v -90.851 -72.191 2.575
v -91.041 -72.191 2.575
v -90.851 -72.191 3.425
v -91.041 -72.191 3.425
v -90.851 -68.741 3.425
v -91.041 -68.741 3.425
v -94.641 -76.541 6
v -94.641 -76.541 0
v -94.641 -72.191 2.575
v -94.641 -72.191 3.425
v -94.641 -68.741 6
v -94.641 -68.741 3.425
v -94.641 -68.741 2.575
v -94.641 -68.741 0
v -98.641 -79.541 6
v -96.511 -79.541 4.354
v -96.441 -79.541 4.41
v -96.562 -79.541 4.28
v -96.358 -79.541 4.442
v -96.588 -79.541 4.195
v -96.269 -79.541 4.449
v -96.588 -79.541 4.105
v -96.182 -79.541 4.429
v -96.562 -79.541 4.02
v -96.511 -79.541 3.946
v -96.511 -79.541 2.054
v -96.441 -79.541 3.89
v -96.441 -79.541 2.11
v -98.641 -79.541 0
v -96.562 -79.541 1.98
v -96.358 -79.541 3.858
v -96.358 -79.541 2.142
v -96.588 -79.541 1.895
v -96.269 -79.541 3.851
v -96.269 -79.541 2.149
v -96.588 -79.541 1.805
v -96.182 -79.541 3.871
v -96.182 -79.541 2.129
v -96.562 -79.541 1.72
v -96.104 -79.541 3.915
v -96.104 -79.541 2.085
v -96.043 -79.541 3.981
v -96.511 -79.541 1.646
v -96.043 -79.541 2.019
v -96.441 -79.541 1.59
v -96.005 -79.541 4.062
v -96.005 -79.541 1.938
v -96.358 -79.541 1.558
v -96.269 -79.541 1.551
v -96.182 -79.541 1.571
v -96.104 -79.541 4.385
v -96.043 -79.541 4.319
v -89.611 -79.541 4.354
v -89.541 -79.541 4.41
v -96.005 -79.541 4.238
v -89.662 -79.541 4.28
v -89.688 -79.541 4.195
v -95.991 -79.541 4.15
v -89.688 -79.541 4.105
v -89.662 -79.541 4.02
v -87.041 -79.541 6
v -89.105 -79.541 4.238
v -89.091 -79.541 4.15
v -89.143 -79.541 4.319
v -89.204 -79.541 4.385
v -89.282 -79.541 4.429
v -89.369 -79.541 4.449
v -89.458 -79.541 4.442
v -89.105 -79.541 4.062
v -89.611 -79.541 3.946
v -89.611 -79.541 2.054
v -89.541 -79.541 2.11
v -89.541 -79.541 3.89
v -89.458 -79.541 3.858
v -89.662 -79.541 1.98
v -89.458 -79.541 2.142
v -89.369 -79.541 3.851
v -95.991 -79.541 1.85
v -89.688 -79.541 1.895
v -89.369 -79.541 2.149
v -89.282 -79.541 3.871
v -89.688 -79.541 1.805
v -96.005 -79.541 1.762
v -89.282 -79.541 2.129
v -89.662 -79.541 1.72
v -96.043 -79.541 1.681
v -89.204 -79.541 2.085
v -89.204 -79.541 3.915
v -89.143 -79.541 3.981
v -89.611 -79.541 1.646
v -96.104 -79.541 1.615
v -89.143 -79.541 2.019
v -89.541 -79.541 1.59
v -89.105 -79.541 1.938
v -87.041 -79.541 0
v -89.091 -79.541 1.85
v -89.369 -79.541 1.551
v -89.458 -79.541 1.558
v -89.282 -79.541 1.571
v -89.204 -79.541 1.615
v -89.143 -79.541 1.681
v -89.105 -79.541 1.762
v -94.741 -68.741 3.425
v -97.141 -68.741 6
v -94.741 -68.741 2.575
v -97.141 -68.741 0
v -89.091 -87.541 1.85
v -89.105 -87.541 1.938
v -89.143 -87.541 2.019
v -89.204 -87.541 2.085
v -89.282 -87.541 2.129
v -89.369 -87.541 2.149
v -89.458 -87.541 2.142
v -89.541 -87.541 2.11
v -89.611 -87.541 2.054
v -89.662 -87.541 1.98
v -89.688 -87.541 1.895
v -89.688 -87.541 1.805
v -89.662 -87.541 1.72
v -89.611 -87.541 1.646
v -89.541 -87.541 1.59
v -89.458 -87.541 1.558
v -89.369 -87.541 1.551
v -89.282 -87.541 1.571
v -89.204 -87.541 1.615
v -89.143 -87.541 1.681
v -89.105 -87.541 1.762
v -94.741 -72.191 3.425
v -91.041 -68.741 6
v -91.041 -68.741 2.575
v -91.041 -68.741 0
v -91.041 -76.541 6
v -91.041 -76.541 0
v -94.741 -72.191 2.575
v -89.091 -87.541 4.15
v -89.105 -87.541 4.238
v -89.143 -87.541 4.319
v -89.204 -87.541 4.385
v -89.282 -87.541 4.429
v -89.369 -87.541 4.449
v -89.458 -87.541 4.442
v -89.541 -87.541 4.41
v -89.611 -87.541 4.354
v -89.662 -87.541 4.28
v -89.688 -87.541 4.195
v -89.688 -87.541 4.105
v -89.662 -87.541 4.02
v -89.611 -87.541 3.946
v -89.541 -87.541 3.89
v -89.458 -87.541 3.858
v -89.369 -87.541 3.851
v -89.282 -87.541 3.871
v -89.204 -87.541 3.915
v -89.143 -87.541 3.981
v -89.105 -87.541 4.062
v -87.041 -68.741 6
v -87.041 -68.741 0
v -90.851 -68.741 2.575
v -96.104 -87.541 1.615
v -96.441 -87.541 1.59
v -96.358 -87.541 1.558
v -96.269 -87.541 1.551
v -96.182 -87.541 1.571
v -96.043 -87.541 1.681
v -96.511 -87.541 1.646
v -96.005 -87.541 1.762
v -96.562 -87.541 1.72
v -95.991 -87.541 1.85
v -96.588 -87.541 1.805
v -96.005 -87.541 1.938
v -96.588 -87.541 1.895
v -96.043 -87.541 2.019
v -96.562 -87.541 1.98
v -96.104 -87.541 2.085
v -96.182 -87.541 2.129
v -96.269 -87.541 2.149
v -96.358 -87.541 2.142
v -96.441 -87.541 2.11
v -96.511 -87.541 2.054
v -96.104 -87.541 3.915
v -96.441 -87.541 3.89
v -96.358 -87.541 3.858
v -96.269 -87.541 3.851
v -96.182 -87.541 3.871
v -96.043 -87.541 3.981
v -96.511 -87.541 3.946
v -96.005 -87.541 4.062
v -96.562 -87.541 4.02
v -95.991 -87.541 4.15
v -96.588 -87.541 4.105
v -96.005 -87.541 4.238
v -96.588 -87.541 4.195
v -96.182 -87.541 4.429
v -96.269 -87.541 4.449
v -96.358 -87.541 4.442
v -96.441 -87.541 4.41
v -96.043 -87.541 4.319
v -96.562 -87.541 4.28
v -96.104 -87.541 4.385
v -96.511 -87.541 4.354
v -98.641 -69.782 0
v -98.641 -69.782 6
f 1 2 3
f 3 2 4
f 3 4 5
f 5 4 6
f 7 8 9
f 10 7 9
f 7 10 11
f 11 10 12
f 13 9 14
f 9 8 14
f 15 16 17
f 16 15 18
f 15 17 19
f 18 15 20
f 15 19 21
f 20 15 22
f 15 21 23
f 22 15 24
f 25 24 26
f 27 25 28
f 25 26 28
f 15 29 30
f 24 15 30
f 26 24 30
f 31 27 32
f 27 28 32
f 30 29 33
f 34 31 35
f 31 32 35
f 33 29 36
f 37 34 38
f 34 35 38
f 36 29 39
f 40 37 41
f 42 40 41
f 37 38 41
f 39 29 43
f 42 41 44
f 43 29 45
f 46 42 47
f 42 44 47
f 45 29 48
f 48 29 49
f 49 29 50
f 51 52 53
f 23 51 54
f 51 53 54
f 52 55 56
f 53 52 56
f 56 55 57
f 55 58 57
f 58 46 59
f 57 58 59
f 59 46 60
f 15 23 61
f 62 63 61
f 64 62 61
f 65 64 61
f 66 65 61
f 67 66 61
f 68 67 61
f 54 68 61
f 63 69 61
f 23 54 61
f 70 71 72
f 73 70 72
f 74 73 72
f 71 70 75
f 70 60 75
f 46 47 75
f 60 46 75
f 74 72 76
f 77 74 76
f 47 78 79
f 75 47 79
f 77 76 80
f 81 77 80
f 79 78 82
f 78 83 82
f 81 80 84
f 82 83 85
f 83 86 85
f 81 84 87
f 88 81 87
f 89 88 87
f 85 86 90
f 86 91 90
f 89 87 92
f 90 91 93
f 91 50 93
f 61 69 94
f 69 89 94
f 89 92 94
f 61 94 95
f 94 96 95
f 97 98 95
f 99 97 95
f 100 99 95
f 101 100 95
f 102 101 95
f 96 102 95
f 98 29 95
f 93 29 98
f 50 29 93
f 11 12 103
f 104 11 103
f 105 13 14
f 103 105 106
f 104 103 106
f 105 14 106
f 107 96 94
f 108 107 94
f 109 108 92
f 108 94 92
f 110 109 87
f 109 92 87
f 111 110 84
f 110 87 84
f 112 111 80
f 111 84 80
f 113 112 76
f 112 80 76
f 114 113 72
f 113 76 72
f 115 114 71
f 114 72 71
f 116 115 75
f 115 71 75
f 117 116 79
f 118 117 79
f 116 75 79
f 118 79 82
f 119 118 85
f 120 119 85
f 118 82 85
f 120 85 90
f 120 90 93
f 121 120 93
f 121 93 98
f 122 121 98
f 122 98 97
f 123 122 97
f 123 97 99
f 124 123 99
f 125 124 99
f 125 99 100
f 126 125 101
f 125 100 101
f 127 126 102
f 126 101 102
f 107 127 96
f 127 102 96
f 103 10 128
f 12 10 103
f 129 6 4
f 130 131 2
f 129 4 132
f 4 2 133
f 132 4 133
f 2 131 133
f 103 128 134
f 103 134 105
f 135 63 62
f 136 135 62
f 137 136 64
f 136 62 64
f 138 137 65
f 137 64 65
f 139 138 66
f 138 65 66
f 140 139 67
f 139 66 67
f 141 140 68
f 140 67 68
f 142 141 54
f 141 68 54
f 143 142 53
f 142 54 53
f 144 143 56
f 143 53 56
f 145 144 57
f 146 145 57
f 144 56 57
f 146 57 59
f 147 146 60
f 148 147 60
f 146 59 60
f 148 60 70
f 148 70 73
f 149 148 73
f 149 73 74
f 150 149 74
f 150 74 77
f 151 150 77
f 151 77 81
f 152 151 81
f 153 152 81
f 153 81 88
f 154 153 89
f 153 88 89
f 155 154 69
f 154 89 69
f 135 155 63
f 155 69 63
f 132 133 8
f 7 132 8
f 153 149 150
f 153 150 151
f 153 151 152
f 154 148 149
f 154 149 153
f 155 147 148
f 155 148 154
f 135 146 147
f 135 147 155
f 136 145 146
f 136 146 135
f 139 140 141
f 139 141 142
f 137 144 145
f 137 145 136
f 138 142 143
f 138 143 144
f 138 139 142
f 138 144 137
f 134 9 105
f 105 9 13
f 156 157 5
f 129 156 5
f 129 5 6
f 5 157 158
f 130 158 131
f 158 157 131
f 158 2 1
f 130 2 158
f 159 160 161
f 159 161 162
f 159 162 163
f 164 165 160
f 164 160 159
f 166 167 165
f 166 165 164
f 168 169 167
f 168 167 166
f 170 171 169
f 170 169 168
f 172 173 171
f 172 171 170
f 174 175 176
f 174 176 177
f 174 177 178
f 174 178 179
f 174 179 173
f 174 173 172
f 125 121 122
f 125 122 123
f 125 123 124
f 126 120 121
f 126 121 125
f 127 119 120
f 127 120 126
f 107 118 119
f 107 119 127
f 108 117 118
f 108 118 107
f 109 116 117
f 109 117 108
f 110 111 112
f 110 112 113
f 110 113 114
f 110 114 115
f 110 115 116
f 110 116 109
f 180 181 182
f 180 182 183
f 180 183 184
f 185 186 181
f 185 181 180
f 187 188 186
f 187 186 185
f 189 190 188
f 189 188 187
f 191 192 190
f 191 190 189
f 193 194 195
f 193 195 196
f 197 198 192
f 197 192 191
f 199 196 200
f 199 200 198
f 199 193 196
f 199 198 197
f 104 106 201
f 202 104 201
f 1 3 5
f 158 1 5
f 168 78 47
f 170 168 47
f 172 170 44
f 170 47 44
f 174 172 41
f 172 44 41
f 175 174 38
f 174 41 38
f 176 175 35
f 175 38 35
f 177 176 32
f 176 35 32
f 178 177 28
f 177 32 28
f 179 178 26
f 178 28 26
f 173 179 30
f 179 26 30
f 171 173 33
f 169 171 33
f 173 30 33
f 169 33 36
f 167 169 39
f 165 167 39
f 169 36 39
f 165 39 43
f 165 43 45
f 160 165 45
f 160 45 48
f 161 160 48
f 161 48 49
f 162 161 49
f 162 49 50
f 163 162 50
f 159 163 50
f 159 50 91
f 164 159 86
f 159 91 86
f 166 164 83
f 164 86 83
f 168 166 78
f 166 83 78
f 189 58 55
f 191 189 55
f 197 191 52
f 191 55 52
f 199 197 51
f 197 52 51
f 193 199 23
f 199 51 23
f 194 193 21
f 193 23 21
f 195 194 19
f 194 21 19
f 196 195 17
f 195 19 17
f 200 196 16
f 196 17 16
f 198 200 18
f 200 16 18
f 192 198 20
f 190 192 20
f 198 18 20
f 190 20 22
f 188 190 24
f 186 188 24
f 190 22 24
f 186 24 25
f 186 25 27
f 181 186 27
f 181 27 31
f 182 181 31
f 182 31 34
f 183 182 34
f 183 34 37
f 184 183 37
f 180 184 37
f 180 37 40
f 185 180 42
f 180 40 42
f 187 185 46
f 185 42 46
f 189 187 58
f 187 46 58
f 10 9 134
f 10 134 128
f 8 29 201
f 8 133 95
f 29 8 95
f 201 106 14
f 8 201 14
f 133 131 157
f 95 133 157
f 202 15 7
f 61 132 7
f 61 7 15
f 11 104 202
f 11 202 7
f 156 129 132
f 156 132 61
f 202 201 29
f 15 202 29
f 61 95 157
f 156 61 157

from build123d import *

# Parameters (mm, degrees)
F1_DEPTH      = 6
F2_W          = 3.45
F2_H          = 0.85
F3_DEPTH      = 0.1
F3_DEPTH_BACK = 3.79
F4_R          = 0.3
F5_DEPTH      = 8


with BuildPart() as f1:
    # F0 (on Top) → F1 (new body)
    with BuildSketch(Plane.XY):
        Polygon((-98.6413434148, -69.7821304202), (-98.6413434148, -79.5412585139), (-87.0413434148, -79.5412585139), (-87.0413434148, -68.7412585139), (-91.0413434148, -68.7412585139), (-91.0413434148, -76.5412585139), (-94.6413434148, -76.5412585139), (-94.6413434148, -68.7412585139), (-97.1413434148, -68.7412585139), align=None)
    extrude(amount=F1_DEPTH)

    # F2 (on face) → F3 (cut, two sides)
    with BuildSketch(Plane.YZ.offset(-94.6413434148)) as f3_sk:
        with Locations((-70.4662585139, 3)):
            Rectangle(F2_W, F2_H)
    extrude(amount=-F3_DEPTH, mode=Mode.SUBTRACT)
    extrude(f3_sk.sketch, amount=F3_DEPTH_BACK, mode=Mode.SUBTRACT)

    # F4 (on face) → F5 (join)
    with BuildSketch(Plane.XZ.offset(79.5412585139)):
        with Locations((-96.2913434148, 4.15)):
            Circle(F4_R)
        with Locations((-96.2913434148, 1.85)):
            Circle(F4_R)
        with Locations((-89.3913434148, 4.15)):
            Circle(F4_R)
        with Locations((-89.3913434148, 1.85)):
            Circle(F4_R)
    extrude(amount=F5_DEPTH)


solid = f1.part
